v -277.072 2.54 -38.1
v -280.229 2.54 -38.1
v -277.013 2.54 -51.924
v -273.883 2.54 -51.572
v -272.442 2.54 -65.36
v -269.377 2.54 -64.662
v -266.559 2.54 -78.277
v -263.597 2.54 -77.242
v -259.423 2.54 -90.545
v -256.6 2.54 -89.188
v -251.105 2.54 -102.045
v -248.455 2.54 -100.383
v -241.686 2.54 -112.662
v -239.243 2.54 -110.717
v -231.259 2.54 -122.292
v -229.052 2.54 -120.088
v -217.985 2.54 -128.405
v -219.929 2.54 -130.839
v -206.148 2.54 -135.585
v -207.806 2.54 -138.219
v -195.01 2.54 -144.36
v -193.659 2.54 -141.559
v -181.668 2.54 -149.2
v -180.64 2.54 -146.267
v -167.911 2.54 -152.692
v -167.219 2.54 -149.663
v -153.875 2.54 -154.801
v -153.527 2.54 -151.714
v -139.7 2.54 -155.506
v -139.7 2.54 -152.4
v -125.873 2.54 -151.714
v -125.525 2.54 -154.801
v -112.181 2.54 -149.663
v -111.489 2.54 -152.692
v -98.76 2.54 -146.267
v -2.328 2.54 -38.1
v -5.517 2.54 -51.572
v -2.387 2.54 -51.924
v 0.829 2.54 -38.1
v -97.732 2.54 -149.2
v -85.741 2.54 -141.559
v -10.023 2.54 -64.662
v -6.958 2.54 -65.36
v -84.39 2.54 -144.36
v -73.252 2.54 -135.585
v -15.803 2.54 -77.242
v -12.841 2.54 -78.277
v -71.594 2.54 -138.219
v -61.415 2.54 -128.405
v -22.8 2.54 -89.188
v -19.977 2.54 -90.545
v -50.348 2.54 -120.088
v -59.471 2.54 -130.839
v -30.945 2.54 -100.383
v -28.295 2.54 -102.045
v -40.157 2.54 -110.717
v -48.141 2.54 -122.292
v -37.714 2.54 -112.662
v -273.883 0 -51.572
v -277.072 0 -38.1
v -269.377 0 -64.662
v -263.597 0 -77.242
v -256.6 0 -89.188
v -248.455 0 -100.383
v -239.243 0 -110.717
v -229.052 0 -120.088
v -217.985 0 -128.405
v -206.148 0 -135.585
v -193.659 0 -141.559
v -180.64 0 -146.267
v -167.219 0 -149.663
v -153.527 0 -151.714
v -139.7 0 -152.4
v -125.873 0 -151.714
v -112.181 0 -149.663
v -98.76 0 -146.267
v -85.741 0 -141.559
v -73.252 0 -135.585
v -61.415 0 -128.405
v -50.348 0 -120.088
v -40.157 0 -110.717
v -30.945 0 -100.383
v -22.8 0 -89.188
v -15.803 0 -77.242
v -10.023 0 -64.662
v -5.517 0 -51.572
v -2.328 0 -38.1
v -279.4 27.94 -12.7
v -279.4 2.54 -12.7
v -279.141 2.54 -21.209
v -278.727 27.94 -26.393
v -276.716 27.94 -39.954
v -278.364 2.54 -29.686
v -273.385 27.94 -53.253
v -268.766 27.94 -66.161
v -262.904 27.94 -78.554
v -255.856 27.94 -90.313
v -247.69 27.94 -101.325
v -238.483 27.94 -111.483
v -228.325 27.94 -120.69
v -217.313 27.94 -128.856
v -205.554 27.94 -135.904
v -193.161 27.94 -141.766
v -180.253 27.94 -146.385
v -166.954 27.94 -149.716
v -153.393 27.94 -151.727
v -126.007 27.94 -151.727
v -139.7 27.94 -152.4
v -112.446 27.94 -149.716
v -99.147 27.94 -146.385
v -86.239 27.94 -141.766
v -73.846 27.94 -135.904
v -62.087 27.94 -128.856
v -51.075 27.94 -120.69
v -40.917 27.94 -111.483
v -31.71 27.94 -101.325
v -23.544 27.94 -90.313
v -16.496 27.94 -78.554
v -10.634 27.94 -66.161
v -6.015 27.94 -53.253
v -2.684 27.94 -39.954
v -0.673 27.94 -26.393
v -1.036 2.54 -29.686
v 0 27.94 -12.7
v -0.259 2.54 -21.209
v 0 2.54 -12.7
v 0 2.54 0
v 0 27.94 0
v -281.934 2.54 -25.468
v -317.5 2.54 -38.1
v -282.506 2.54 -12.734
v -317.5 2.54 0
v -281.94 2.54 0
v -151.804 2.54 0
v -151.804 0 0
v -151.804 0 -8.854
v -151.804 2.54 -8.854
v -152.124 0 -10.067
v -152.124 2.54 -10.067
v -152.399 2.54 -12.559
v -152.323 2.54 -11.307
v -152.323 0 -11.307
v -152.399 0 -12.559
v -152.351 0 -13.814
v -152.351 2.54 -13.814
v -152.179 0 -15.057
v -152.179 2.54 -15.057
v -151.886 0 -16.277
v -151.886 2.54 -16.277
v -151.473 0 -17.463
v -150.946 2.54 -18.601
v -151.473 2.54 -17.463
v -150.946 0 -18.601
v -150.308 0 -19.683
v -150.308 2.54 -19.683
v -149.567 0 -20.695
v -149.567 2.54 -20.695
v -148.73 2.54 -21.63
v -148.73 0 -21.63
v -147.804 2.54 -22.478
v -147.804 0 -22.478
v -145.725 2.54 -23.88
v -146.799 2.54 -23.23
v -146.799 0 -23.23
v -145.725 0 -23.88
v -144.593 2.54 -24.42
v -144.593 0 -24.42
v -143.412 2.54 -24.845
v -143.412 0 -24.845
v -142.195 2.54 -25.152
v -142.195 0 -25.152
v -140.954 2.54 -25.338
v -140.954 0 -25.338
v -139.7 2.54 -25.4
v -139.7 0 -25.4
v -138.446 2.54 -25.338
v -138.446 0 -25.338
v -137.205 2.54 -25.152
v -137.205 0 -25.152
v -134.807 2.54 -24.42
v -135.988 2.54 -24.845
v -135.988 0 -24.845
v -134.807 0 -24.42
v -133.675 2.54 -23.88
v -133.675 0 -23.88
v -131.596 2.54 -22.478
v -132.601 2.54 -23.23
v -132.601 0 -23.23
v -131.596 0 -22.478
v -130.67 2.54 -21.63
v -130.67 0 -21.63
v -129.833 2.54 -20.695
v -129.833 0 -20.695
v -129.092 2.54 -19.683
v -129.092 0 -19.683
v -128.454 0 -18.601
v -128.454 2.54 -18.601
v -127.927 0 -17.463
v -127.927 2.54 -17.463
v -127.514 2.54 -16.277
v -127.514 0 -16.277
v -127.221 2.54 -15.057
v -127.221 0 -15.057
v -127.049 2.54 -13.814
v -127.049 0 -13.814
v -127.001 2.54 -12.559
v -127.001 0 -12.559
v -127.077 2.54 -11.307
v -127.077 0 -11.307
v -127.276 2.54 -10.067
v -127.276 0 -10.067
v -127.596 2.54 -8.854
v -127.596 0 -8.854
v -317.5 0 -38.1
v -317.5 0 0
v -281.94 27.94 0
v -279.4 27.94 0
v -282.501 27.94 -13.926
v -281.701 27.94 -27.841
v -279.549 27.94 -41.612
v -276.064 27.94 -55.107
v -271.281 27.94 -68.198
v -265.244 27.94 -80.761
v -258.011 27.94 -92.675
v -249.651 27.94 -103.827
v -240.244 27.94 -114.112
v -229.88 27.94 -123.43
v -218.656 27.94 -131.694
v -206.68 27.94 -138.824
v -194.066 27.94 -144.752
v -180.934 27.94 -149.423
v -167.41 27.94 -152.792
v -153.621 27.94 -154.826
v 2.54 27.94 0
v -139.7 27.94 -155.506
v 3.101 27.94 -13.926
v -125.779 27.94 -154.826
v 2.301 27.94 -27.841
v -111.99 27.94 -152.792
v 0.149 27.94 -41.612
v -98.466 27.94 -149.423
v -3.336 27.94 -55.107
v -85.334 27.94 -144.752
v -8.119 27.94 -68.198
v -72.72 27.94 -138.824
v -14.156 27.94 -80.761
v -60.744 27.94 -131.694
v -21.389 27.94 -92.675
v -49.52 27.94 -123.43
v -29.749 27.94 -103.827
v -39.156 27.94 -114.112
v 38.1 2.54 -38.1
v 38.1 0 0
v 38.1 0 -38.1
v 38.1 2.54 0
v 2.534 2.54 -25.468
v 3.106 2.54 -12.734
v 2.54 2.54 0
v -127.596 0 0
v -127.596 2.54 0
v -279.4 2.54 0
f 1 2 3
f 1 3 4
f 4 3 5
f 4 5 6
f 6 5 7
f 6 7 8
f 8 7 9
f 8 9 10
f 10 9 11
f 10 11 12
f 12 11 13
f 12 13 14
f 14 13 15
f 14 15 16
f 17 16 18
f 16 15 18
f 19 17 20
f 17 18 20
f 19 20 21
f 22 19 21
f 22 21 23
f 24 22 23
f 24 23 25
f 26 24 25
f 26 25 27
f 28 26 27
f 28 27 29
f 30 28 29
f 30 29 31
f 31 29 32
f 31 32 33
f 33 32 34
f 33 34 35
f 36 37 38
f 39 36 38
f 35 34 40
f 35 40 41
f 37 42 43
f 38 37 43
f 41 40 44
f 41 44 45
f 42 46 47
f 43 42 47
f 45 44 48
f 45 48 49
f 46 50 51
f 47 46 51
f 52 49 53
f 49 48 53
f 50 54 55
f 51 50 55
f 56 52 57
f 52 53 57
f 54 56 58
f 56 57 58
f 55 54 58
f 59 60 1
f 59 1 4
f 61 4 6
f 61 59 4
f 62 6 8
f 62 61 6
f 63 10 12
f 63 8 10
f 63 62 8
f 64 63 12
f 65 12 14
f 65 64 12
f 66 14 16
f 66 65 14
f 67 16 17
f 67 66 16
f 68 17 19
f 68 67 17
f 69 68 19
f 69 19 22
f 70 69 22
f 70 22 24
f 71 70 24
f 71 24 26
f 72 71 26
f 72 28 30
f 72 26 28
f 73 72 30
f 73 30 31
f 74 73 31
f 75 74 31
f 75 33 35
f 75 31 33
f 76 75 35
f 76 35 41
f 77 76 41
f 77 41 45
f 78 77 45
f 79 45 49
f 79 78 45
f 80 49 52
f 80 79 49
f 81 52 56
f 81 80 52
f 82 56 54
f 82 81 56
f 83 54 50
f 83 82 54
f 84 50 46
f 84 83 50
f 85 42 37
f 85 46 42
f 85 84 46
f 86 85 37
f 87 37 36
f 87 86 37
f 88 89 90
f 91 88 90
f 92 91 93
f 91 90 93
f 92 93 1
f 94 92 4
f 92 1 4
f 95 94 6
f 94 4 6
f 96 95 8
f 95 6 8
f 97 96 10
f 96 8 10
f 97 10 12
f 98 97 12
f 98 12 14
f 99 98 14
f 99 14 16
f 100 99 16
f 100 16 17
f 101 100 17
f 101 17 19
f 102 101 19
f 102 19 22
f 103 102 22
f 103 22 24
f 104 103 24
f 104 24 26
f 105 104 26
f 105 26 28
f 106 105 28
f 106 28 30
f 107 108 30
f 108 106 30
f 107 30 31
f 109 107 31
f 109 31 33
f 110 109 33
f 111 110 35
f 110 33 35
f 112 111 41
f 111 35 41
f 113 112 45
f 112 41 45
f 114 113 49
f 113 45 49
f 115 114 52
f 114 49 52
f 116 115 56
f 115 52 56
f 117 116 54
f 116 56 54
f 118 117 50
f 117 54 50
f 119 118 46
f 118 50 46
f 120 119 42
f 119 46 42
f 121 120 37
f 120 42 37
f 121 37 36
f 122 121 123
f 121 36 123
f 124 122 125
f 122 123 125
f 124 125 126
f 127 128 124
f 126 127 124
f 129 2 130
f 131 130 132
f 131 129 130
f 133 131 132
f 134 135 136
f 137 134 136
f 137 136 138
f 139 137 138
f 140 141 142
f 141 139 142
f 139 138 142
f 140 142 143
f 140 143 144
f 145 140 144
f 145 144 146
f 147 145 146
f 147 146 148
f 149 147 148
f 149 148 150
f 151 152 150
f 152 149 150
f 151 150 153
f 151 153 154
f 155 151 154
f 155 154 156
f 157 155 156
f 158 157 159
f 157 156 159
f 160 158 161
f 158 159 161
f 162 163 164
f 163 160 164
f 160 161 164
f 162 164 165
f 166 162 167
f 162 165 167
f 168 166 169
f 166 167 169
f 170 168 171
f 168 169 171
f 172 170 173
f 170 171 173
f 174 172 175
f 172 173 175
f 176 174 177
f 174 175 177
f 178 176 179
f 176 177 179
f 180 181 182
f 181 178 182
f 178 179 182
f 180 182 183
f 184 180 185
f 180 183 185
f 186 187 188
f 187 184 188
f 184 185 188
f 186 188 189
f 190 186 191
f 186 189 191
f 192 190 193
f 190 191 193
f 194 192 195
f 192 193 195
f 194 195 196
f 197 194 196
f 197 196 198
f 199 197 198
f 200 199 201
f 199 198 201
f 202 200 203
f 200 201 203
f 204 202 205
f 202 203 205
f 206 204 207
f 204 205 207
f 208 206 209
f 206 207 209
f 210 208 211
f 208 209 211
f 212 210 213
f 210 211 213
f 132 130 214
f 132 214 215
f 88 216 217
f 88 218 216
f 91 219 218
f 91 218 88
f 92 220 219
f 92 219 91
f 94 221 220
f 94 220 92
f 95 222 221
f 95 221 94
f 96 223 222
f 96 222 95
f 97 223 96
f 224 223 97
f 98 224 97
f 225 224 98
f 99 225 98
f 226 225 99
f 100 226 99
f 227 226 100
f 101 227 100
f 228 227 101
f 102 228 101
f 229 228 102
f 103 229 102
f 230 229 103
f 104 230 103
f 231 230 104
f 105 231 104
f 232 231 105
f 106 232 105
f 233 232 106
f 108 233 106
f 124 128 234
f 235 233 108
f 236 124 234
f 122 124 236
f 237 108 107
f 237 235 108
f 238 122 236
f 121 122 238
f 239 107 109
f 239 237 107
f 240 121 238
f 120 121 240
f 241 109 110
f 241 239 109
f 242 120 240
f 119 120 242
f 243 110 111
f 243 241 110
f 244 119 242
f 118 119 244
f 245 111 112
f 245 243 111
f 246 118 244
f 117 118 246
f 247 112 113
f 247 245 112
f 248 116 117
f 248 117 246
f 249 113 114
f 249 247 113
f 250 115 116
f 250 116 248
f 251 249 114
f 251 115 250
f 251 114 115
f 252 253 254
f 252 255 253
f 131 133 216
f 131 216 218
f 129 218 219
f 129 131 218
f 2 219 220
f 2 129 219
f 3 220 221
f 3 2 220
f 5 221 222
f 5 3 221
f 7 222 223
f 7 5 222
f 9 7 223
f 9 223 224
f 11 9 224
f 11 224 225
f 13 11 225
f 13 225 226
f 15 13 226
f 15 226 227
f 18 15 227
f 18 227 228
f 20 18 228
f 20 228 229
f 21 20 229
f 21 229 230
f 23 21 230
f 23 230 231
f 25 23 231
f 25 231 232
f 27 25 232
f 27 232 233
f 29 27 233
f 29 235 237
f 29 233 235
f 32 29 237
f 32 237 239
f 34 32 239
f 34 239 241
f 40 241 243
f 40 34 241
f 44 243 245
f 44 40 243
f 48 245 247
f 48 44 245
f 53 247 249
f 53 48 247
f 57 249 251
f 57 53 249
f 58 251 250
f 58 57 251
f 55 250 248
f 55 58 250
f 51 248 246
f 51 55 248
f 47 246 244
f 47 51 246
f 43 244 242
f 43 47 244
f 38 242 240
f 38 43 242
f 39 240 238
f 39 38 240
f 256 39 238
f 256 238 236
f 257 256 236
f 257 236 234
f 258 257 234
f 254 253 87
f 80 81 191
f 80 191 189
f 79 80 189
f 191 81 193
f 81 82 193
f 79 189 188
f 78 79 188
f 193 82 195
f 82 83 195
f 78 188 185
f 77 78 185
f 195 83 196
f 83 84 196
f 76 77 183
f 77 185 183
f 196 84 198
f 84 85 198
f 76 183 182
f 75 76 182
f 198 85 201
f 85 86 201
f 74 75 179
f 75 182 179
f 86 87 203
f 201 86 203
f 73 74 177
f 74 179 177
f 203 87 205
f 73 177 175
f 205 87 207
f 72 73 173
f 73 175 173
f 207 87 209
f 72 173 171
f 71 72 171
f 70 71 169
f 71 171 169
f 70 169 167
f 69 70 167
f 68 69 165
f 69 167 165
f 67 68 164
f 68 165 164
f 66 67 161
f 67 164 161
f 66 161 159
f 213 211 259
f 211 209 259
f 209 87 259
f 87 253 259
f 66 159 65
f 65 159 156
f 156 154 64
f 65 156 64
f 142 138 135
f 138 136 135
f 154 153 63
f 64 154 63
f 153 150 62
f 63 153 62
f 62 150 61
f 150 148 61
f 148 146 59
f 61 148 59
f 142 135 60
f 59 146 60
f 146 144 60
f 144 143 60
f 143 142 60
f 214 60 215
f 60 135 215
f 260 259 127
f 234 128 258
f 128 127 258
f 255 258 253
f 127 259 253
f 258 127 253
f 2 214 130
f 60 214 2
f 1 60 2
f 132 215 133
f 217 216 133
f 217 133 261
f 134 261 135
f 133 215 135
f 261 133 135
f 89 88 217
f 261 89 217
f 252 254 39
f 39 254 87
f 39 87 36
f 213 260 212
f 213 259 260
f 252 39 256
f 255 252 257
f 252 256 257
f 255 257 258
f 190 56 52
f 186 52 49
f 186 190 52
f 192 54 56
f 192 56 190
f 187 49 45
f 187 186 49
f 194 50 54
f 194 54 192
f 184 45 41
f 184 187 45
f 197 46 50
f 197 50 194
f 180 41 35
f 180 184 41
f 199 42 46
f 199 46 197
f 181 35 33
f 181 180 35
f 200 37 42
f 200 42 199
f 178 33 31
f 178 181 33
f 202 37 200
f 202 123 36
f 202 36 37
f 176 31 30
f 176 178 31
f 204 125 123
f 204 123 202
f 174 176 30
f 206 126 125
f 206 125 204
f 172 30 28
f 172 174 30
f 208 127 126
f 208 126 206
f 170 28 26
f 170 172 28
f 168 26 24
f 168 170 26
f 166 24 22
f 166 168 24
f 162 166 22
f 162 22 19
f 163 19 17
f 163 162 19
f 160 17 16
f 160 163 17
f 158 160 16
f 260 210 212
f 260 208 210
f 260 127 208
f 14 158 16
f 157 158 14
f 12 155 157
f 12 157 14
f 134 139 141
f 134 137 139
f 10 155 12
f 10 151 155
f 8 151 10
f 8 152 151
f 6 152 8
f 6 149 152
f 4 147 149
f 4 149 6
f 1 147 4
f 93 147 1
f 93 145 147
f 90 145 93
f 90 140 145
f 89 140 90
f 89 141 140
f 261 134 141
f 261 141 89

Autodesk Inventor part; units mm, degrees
ref_plane "YZ Plane" through (0, 0, 0) normal (1, 0, 0) x (0, 1, 0)
ref_plane "XZ Plane" through (0, 0, 0) normal (0, 1, 0) x (-1, 0, 0)
ref_plane "XY Plane" through (0, 0, 0) normal (0, 0, 1) x (1, 0, 0)
sketch "Sketch3" plane through (0, 0, 0) normal (0, 1, 0) x (-1, 0, 0)
  arc A0 (127.5964, -8.854) -> (151.8036, -8.854) centre (139.7, -12.7) ccw
  arc A1 (0, -12.7) -> (279.4, -12.7) centre (139.7, -12.7) ccw
  line L0 (279.4, -12.7) -> (279.4, 0)
  line L1 (279.4, 0) -> (151.8036, 0)
  line L2 (151.8036, 0) -> (151.8036, -8.854)
  line L3 (127.5964, 0) -> (0, 0)
  line L4 (0, 0) -> (0, -12.7)
  line L5 (127.5964, 0) -> (127.5964, -8.854)
  point P0 (0, -12.7)
  dimension "d9" = 279.4
extrude "Extrusion2" add sketch "Sketch3" along normal blind 2.54
sketch "Sketch4" plane through (0, 2.54, 0) normal (0, 1, 0) x (1, 0, 0)
  arc A0 (-127.5964, 8.854) -> (-151.8036, 8.854) centre (-139.7, 12.7) ccw projected
  arc A1 (0, 12.7) -> (-279.4, 12.7) centre (-139.7, 12.7) ccw
  line L0 (-127.5964, 0) -> (0, 0) projected
  line L1 (0, 0) -> (2.54, 0)
  line L2 (-279.4, 12.7) -> (-279.4, 0) projected
  line L3 (-279.4, 0) -> (-281.94, 0)
  circle A2 centre (-139.7, 12.7) radius 142.8058
  line L4 (0, 0) -> (2.54, 0)
  line L5 (0, 0) -> (0, 12.7)
  arc A3 (0, 12.7) -> (-279.4, 12.7) centre (-139.7, 12.7) ccw projected
  line L6 (-279.4, 0) -> (-279.4, 12.7)
  line L7 (-279.4, 0) -> (-281.94, 0)
  dimension "d12" = 2.54
  dimension "d13" = 2.54
extrude "Extrusion3" add sketch "Sketch4" along normal blind 25.4 contours A1 L2 L3 A2 L1 L5 picked at (-280.1039, 19.3593)
sketch "Sketch6" plane through (-279.4, 0, -12.7) normal (-1, 0, 0) x (0, 0, 1)
  line L0 (12.7, 0) -> (3.846, 0) projected
  line L1 (0, 2.54) -> (-139.7, 2.54) projected
  line L2 (12.7, 0) -> (-25.4, 0)
  line L3 (-25.4, 0) -> (-25.4, 2.54)
  line L4 (-25.4, 2.54) -> (12.7, 2.54)
  line L5 (12.7, 2.54) -> (12.7, 0)
  dimension "d16" = 38.1
extrude "Extrusion4" add sketch "Sketch6" along normal mid plane 76.2
sketch "Sketch7" plane through (0, 0, 0) normal (1, 0, 0) x (0, 0, -1)
  line L0 (38.1, 0) -> (0, 0) projected
  line L1 (0, 0) -> (38.1, 0)
  line L2 (38.1, 0) -> (38.1, 2.54)
  line L3 (38.1, 2.54) -> (0, 2.54)
  line L4 (0, 2.54) -> (0, 0)
  dimension "d19" = 38.1
  dimension "d20" = 2.54
extrude "Extrusion5" add sketch "Sketch7" along normal mid plane 76.2
properties part number "FlatRotationalTransfer"
